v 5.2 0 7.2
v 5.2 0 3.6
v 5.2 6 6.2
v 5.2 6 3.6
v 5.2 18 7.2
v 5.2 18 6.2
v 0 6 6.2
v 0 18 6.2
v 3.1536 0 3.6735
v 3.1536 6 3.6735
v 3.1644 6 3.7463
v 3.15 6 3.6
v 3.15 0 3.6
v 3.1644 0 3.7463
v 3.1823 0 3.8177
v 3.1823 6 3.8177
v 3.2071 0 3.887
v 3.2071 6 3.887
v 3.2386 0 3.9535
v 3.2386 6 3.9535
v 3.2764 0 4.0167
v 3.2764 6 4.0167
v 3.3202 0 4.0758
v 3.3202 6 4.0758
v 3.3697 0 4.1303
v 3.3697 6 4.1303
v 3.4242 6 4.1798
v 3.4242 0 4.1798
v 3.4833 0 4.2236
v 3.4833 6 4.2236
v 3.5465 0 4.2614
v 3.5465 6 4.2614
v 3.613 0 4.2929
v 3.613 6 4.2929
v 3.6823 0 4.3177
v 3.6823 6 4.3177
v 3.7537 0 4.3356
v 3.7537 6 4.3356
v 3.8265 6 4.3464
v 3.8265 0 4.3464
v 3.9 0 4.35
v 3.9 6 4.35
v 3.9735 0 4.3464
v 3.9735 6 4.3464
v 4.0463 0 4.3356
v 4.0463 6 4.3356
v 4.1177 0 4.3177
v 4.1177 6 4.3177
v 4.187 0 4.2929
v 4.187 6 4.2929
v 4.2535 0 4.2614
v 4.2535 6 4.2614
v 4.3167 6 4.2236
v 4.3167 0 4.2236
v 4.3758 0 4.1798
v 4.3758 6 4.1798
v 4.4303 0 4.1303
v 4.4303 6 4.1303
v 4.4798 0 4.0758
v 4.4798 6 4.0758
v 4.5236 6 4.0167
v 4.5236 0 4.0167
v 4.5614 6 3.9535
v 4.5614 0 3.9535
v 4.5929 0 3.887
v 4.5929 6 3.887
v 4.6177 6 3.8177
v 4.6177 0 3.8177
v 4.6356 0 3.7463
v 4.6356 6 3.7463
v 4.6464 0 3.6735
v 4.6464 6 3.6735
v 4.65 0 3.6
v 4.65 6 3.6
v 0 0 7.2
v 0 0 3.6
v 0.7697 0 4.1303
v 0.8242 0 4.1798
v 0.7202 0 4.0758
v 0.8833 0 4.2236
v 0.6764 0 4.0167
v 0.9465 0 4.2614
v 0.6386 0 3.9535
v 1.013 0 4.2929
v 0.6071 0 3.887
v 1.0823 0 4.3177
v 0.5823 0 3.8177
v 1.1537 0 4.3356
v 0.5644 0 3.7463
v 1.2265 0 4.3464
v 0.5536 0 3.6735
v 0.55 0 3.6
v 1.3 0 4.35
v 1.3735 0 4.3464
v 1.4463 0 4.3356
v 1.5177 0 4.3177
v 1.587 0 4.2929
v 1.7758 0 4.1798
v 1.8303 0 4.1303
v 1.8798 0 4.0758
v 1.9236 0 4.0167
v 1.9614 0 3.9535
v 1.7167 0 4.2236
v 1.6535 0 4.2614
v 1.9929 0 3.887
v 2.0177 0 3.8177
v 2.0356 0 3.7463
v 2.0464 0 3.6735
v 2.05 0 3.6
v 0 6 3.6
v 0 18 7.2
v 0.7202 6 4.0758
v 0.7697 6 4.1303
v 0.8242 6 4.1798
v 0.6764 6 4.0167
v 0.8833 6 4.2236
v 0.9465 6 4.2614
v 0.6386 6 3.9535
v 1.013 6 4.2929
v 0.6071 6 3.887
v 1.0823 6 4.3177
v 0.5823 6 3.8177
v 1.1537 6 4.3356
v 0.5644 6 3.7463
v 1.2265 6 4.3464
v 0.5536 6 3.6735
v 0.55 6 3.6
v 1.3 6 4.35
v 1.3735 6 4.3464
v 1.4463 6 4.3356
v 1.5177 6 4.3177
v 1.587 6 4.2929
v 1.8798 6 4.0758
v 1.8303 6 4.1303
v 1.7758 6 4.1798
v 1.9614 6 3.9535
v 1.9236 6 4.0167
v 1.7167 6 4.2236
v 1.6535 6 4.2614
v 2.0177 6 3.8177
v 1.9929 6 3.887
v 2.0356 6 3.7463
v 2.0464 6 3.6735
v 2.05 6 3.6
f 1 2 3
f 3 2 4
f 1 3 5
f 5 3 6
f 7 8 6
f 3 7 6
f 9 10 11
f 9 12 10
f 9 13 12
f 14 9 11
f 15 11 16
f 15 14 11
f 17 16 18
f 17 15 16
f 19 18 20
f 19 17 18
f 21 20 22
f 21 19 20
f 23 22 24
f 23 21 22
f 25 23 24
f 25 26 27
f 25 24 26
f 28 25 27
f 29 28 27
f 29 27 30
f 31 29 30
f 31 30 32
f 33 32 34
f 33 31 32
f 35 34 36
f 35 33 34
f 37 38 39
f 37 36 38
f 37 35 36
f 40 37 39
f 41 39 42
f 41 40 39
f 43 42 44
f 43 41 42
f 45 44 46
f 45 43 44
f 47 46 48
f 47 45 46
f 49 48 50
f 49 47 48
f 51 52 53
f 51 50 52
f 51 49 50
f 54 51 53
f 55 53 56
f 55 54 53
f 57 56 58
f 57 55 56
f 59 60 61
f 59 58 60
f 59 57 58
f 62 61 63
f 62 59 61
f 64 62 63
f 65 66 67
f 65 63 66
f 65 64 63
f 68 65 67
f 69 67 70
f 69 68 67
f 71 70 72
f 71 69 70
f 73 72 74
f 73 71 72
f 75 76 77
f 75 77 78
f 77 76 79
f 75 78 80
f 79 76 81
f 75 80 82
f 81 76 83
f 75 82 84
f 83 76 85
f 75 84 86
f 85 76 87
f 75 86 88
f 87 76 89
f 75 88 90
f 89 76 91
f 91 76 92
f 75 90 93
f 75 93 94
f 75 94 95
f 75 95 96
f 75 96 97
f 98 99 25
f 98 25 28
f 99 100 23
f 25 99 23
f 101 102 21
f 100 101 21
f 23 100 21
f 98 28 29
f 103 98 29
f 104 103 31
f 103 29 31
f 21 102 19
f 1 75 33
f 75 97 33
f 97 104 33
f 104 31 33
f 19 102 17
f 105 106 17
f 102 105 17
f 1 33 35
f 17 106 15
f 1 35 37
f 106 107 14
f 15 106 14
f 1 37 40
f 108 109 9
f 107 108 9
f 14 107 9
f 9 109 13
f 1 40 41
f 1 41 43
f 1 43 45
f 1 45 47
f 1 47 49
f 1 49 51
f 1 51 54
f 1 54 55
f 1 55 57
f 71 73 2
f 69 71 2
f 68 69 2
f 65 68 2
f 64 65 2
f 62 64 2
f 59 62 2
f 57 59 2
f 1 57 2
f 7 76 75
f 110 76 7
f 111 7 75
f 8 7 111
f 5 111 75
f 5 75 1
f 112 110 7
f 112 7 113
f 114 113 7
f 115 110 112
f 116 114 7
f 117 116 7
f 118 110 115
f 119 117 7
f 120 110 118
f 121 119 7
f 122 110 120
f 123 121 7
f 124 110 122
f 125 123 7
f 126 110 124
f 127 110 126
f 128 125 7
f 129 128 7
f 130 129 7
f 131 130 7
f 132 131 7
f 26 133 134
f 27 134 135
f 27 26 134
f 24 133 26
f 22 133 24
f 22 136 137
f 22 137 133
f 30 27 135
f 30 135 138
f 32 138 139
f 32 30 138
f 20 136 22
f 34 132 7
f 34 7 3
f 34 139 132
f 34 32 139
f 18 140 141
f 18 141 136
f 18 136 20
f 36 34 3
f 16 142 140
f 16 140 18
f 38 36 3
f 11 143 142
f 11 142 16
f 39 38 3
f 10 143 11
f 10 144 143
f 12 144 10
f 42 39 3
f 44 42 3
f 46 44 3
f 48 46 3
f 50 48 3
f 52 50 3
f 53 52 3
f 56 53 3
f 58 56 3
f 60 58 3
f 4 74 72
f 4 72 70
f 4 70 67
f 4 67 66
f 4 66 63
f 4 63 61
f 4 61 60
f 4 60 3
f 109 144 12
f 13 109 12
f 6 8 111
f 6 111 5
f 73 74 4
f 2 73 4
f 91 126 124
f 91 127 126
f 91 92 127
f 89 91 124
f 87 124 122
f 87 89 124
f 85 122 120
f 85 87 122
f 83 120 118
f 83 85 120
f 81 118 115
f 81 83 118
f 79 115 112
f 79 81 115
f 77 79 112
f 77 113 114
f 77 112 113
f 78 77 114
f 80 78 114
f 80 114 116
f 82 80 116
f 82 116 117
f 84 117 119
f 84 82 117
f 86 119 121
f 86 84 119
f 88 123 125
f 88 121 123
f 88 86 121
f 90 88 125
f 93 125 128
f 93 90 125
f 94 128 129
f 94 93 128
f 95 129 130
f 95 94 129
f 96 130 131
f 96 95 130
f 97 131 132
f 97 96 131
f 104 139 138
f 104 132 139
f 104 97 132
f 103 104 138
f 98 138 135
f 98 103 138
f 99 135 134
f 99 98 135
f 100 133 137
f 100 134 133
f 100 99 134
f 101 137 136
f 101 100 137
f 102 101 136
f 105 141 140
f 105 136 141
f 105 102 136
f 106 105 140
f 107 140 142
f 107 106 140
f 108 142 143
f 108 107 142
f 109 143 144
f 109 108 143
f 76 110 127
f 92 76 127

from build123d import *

# Parameters (mm, degrees)
BOX016_W          = 30
BOX016_H          = 20
BOX016_DEPTH      = 9.2
BOX015_W          = 26
BOX015_H          = 12
BOX015_DEPTH      = 5.2
CYLINDER007_R     = 0.75
CYLINDER007_DEPTH = 7
ARRAY007_X_COUNT  = 2
ARRAY007_X_PITCH  = 2.6
ARRAY007_Y_COUNT  = 2
ARRAY007_Y_PITCH  = 1
BOX014_W          = 5.2
BOX014_H          = 18
BOX014_DEPTH      = 7.2


with BuildPart() as cortador:
    # Box016 → Box016 (new body)
    with BuildSketch(Plane(origin=(-1, -2, -5.6), x_dir=(1, 0, 0), z_dir=(0, 0, 1))):
        with Locations((15, 10)):
            Rectangle(BOX016_W, BOX016_H)
    extrude(amount=BOX016_DEPTH)


with BuildPart() as cube_10_base009:
    # Box015 → Box015 (new body)
    with BuildSketch(Plane(origin=(0, 6, 1), x_dir=(1, 0, 0), z_dir=(0, 0, 1))):
        with Locations((13, 6)):
            Rectangle(BOX015_W, BOX015_H)
    extrude(amount=BOX015_DEPTH)


with BuildPart() as array007:
    # Cylinder007 → Cylinder007 (new body)
    with BuildSketch(Plane(origin=(1.3, -1, 3.6), x_dir=(1, 0, 0), z_dir=(0, 1, 0))):
        Circle(CYLINDER007_R)
    extrude(amount=CYLINDER007_DEPTH)

    # Array007 X: Array007 ×2


with BuildPart() as array007_1:
    add(array007.part)
    with Locations(*[(i * ARRAY007_X_PITCH, 0, 0) for i in range(1, ARRAY007_X_COUNT)]):
        add(array007.part)

    # Array007 Y: Array007 ×2


with BuildPart() as array007_2:
    add(array007_1.part)
    with Locations(*[(0, i * ARRAY007_Y_PITCH, 0) for i in range(1, ARRAY007_Y_COUNT)]):
        add(array007_1.part)


with BuildPart() as bloque2_arriba:
    # Box014 → Box014 (new body)
    with BuildSketch(Plane.XY):
        with Locations((2.6, 9)):
            Rectangle(BOX014_W, BOX014_H)
    extrude(amount=BOX014_DEPTH)

    # Cut015: cut Array007
    add(array007_2.part, mode=Mode.SUBTRACT)

    # Cut014: cut cube_10_base009
    add(cube_10_base009.part, mode=Mode.SUBTRACT)

    # Cut016: cut cortador
    add(cortador.part, mode=Mode.SUBTRACT)


solid = bloque2_arriba.part
